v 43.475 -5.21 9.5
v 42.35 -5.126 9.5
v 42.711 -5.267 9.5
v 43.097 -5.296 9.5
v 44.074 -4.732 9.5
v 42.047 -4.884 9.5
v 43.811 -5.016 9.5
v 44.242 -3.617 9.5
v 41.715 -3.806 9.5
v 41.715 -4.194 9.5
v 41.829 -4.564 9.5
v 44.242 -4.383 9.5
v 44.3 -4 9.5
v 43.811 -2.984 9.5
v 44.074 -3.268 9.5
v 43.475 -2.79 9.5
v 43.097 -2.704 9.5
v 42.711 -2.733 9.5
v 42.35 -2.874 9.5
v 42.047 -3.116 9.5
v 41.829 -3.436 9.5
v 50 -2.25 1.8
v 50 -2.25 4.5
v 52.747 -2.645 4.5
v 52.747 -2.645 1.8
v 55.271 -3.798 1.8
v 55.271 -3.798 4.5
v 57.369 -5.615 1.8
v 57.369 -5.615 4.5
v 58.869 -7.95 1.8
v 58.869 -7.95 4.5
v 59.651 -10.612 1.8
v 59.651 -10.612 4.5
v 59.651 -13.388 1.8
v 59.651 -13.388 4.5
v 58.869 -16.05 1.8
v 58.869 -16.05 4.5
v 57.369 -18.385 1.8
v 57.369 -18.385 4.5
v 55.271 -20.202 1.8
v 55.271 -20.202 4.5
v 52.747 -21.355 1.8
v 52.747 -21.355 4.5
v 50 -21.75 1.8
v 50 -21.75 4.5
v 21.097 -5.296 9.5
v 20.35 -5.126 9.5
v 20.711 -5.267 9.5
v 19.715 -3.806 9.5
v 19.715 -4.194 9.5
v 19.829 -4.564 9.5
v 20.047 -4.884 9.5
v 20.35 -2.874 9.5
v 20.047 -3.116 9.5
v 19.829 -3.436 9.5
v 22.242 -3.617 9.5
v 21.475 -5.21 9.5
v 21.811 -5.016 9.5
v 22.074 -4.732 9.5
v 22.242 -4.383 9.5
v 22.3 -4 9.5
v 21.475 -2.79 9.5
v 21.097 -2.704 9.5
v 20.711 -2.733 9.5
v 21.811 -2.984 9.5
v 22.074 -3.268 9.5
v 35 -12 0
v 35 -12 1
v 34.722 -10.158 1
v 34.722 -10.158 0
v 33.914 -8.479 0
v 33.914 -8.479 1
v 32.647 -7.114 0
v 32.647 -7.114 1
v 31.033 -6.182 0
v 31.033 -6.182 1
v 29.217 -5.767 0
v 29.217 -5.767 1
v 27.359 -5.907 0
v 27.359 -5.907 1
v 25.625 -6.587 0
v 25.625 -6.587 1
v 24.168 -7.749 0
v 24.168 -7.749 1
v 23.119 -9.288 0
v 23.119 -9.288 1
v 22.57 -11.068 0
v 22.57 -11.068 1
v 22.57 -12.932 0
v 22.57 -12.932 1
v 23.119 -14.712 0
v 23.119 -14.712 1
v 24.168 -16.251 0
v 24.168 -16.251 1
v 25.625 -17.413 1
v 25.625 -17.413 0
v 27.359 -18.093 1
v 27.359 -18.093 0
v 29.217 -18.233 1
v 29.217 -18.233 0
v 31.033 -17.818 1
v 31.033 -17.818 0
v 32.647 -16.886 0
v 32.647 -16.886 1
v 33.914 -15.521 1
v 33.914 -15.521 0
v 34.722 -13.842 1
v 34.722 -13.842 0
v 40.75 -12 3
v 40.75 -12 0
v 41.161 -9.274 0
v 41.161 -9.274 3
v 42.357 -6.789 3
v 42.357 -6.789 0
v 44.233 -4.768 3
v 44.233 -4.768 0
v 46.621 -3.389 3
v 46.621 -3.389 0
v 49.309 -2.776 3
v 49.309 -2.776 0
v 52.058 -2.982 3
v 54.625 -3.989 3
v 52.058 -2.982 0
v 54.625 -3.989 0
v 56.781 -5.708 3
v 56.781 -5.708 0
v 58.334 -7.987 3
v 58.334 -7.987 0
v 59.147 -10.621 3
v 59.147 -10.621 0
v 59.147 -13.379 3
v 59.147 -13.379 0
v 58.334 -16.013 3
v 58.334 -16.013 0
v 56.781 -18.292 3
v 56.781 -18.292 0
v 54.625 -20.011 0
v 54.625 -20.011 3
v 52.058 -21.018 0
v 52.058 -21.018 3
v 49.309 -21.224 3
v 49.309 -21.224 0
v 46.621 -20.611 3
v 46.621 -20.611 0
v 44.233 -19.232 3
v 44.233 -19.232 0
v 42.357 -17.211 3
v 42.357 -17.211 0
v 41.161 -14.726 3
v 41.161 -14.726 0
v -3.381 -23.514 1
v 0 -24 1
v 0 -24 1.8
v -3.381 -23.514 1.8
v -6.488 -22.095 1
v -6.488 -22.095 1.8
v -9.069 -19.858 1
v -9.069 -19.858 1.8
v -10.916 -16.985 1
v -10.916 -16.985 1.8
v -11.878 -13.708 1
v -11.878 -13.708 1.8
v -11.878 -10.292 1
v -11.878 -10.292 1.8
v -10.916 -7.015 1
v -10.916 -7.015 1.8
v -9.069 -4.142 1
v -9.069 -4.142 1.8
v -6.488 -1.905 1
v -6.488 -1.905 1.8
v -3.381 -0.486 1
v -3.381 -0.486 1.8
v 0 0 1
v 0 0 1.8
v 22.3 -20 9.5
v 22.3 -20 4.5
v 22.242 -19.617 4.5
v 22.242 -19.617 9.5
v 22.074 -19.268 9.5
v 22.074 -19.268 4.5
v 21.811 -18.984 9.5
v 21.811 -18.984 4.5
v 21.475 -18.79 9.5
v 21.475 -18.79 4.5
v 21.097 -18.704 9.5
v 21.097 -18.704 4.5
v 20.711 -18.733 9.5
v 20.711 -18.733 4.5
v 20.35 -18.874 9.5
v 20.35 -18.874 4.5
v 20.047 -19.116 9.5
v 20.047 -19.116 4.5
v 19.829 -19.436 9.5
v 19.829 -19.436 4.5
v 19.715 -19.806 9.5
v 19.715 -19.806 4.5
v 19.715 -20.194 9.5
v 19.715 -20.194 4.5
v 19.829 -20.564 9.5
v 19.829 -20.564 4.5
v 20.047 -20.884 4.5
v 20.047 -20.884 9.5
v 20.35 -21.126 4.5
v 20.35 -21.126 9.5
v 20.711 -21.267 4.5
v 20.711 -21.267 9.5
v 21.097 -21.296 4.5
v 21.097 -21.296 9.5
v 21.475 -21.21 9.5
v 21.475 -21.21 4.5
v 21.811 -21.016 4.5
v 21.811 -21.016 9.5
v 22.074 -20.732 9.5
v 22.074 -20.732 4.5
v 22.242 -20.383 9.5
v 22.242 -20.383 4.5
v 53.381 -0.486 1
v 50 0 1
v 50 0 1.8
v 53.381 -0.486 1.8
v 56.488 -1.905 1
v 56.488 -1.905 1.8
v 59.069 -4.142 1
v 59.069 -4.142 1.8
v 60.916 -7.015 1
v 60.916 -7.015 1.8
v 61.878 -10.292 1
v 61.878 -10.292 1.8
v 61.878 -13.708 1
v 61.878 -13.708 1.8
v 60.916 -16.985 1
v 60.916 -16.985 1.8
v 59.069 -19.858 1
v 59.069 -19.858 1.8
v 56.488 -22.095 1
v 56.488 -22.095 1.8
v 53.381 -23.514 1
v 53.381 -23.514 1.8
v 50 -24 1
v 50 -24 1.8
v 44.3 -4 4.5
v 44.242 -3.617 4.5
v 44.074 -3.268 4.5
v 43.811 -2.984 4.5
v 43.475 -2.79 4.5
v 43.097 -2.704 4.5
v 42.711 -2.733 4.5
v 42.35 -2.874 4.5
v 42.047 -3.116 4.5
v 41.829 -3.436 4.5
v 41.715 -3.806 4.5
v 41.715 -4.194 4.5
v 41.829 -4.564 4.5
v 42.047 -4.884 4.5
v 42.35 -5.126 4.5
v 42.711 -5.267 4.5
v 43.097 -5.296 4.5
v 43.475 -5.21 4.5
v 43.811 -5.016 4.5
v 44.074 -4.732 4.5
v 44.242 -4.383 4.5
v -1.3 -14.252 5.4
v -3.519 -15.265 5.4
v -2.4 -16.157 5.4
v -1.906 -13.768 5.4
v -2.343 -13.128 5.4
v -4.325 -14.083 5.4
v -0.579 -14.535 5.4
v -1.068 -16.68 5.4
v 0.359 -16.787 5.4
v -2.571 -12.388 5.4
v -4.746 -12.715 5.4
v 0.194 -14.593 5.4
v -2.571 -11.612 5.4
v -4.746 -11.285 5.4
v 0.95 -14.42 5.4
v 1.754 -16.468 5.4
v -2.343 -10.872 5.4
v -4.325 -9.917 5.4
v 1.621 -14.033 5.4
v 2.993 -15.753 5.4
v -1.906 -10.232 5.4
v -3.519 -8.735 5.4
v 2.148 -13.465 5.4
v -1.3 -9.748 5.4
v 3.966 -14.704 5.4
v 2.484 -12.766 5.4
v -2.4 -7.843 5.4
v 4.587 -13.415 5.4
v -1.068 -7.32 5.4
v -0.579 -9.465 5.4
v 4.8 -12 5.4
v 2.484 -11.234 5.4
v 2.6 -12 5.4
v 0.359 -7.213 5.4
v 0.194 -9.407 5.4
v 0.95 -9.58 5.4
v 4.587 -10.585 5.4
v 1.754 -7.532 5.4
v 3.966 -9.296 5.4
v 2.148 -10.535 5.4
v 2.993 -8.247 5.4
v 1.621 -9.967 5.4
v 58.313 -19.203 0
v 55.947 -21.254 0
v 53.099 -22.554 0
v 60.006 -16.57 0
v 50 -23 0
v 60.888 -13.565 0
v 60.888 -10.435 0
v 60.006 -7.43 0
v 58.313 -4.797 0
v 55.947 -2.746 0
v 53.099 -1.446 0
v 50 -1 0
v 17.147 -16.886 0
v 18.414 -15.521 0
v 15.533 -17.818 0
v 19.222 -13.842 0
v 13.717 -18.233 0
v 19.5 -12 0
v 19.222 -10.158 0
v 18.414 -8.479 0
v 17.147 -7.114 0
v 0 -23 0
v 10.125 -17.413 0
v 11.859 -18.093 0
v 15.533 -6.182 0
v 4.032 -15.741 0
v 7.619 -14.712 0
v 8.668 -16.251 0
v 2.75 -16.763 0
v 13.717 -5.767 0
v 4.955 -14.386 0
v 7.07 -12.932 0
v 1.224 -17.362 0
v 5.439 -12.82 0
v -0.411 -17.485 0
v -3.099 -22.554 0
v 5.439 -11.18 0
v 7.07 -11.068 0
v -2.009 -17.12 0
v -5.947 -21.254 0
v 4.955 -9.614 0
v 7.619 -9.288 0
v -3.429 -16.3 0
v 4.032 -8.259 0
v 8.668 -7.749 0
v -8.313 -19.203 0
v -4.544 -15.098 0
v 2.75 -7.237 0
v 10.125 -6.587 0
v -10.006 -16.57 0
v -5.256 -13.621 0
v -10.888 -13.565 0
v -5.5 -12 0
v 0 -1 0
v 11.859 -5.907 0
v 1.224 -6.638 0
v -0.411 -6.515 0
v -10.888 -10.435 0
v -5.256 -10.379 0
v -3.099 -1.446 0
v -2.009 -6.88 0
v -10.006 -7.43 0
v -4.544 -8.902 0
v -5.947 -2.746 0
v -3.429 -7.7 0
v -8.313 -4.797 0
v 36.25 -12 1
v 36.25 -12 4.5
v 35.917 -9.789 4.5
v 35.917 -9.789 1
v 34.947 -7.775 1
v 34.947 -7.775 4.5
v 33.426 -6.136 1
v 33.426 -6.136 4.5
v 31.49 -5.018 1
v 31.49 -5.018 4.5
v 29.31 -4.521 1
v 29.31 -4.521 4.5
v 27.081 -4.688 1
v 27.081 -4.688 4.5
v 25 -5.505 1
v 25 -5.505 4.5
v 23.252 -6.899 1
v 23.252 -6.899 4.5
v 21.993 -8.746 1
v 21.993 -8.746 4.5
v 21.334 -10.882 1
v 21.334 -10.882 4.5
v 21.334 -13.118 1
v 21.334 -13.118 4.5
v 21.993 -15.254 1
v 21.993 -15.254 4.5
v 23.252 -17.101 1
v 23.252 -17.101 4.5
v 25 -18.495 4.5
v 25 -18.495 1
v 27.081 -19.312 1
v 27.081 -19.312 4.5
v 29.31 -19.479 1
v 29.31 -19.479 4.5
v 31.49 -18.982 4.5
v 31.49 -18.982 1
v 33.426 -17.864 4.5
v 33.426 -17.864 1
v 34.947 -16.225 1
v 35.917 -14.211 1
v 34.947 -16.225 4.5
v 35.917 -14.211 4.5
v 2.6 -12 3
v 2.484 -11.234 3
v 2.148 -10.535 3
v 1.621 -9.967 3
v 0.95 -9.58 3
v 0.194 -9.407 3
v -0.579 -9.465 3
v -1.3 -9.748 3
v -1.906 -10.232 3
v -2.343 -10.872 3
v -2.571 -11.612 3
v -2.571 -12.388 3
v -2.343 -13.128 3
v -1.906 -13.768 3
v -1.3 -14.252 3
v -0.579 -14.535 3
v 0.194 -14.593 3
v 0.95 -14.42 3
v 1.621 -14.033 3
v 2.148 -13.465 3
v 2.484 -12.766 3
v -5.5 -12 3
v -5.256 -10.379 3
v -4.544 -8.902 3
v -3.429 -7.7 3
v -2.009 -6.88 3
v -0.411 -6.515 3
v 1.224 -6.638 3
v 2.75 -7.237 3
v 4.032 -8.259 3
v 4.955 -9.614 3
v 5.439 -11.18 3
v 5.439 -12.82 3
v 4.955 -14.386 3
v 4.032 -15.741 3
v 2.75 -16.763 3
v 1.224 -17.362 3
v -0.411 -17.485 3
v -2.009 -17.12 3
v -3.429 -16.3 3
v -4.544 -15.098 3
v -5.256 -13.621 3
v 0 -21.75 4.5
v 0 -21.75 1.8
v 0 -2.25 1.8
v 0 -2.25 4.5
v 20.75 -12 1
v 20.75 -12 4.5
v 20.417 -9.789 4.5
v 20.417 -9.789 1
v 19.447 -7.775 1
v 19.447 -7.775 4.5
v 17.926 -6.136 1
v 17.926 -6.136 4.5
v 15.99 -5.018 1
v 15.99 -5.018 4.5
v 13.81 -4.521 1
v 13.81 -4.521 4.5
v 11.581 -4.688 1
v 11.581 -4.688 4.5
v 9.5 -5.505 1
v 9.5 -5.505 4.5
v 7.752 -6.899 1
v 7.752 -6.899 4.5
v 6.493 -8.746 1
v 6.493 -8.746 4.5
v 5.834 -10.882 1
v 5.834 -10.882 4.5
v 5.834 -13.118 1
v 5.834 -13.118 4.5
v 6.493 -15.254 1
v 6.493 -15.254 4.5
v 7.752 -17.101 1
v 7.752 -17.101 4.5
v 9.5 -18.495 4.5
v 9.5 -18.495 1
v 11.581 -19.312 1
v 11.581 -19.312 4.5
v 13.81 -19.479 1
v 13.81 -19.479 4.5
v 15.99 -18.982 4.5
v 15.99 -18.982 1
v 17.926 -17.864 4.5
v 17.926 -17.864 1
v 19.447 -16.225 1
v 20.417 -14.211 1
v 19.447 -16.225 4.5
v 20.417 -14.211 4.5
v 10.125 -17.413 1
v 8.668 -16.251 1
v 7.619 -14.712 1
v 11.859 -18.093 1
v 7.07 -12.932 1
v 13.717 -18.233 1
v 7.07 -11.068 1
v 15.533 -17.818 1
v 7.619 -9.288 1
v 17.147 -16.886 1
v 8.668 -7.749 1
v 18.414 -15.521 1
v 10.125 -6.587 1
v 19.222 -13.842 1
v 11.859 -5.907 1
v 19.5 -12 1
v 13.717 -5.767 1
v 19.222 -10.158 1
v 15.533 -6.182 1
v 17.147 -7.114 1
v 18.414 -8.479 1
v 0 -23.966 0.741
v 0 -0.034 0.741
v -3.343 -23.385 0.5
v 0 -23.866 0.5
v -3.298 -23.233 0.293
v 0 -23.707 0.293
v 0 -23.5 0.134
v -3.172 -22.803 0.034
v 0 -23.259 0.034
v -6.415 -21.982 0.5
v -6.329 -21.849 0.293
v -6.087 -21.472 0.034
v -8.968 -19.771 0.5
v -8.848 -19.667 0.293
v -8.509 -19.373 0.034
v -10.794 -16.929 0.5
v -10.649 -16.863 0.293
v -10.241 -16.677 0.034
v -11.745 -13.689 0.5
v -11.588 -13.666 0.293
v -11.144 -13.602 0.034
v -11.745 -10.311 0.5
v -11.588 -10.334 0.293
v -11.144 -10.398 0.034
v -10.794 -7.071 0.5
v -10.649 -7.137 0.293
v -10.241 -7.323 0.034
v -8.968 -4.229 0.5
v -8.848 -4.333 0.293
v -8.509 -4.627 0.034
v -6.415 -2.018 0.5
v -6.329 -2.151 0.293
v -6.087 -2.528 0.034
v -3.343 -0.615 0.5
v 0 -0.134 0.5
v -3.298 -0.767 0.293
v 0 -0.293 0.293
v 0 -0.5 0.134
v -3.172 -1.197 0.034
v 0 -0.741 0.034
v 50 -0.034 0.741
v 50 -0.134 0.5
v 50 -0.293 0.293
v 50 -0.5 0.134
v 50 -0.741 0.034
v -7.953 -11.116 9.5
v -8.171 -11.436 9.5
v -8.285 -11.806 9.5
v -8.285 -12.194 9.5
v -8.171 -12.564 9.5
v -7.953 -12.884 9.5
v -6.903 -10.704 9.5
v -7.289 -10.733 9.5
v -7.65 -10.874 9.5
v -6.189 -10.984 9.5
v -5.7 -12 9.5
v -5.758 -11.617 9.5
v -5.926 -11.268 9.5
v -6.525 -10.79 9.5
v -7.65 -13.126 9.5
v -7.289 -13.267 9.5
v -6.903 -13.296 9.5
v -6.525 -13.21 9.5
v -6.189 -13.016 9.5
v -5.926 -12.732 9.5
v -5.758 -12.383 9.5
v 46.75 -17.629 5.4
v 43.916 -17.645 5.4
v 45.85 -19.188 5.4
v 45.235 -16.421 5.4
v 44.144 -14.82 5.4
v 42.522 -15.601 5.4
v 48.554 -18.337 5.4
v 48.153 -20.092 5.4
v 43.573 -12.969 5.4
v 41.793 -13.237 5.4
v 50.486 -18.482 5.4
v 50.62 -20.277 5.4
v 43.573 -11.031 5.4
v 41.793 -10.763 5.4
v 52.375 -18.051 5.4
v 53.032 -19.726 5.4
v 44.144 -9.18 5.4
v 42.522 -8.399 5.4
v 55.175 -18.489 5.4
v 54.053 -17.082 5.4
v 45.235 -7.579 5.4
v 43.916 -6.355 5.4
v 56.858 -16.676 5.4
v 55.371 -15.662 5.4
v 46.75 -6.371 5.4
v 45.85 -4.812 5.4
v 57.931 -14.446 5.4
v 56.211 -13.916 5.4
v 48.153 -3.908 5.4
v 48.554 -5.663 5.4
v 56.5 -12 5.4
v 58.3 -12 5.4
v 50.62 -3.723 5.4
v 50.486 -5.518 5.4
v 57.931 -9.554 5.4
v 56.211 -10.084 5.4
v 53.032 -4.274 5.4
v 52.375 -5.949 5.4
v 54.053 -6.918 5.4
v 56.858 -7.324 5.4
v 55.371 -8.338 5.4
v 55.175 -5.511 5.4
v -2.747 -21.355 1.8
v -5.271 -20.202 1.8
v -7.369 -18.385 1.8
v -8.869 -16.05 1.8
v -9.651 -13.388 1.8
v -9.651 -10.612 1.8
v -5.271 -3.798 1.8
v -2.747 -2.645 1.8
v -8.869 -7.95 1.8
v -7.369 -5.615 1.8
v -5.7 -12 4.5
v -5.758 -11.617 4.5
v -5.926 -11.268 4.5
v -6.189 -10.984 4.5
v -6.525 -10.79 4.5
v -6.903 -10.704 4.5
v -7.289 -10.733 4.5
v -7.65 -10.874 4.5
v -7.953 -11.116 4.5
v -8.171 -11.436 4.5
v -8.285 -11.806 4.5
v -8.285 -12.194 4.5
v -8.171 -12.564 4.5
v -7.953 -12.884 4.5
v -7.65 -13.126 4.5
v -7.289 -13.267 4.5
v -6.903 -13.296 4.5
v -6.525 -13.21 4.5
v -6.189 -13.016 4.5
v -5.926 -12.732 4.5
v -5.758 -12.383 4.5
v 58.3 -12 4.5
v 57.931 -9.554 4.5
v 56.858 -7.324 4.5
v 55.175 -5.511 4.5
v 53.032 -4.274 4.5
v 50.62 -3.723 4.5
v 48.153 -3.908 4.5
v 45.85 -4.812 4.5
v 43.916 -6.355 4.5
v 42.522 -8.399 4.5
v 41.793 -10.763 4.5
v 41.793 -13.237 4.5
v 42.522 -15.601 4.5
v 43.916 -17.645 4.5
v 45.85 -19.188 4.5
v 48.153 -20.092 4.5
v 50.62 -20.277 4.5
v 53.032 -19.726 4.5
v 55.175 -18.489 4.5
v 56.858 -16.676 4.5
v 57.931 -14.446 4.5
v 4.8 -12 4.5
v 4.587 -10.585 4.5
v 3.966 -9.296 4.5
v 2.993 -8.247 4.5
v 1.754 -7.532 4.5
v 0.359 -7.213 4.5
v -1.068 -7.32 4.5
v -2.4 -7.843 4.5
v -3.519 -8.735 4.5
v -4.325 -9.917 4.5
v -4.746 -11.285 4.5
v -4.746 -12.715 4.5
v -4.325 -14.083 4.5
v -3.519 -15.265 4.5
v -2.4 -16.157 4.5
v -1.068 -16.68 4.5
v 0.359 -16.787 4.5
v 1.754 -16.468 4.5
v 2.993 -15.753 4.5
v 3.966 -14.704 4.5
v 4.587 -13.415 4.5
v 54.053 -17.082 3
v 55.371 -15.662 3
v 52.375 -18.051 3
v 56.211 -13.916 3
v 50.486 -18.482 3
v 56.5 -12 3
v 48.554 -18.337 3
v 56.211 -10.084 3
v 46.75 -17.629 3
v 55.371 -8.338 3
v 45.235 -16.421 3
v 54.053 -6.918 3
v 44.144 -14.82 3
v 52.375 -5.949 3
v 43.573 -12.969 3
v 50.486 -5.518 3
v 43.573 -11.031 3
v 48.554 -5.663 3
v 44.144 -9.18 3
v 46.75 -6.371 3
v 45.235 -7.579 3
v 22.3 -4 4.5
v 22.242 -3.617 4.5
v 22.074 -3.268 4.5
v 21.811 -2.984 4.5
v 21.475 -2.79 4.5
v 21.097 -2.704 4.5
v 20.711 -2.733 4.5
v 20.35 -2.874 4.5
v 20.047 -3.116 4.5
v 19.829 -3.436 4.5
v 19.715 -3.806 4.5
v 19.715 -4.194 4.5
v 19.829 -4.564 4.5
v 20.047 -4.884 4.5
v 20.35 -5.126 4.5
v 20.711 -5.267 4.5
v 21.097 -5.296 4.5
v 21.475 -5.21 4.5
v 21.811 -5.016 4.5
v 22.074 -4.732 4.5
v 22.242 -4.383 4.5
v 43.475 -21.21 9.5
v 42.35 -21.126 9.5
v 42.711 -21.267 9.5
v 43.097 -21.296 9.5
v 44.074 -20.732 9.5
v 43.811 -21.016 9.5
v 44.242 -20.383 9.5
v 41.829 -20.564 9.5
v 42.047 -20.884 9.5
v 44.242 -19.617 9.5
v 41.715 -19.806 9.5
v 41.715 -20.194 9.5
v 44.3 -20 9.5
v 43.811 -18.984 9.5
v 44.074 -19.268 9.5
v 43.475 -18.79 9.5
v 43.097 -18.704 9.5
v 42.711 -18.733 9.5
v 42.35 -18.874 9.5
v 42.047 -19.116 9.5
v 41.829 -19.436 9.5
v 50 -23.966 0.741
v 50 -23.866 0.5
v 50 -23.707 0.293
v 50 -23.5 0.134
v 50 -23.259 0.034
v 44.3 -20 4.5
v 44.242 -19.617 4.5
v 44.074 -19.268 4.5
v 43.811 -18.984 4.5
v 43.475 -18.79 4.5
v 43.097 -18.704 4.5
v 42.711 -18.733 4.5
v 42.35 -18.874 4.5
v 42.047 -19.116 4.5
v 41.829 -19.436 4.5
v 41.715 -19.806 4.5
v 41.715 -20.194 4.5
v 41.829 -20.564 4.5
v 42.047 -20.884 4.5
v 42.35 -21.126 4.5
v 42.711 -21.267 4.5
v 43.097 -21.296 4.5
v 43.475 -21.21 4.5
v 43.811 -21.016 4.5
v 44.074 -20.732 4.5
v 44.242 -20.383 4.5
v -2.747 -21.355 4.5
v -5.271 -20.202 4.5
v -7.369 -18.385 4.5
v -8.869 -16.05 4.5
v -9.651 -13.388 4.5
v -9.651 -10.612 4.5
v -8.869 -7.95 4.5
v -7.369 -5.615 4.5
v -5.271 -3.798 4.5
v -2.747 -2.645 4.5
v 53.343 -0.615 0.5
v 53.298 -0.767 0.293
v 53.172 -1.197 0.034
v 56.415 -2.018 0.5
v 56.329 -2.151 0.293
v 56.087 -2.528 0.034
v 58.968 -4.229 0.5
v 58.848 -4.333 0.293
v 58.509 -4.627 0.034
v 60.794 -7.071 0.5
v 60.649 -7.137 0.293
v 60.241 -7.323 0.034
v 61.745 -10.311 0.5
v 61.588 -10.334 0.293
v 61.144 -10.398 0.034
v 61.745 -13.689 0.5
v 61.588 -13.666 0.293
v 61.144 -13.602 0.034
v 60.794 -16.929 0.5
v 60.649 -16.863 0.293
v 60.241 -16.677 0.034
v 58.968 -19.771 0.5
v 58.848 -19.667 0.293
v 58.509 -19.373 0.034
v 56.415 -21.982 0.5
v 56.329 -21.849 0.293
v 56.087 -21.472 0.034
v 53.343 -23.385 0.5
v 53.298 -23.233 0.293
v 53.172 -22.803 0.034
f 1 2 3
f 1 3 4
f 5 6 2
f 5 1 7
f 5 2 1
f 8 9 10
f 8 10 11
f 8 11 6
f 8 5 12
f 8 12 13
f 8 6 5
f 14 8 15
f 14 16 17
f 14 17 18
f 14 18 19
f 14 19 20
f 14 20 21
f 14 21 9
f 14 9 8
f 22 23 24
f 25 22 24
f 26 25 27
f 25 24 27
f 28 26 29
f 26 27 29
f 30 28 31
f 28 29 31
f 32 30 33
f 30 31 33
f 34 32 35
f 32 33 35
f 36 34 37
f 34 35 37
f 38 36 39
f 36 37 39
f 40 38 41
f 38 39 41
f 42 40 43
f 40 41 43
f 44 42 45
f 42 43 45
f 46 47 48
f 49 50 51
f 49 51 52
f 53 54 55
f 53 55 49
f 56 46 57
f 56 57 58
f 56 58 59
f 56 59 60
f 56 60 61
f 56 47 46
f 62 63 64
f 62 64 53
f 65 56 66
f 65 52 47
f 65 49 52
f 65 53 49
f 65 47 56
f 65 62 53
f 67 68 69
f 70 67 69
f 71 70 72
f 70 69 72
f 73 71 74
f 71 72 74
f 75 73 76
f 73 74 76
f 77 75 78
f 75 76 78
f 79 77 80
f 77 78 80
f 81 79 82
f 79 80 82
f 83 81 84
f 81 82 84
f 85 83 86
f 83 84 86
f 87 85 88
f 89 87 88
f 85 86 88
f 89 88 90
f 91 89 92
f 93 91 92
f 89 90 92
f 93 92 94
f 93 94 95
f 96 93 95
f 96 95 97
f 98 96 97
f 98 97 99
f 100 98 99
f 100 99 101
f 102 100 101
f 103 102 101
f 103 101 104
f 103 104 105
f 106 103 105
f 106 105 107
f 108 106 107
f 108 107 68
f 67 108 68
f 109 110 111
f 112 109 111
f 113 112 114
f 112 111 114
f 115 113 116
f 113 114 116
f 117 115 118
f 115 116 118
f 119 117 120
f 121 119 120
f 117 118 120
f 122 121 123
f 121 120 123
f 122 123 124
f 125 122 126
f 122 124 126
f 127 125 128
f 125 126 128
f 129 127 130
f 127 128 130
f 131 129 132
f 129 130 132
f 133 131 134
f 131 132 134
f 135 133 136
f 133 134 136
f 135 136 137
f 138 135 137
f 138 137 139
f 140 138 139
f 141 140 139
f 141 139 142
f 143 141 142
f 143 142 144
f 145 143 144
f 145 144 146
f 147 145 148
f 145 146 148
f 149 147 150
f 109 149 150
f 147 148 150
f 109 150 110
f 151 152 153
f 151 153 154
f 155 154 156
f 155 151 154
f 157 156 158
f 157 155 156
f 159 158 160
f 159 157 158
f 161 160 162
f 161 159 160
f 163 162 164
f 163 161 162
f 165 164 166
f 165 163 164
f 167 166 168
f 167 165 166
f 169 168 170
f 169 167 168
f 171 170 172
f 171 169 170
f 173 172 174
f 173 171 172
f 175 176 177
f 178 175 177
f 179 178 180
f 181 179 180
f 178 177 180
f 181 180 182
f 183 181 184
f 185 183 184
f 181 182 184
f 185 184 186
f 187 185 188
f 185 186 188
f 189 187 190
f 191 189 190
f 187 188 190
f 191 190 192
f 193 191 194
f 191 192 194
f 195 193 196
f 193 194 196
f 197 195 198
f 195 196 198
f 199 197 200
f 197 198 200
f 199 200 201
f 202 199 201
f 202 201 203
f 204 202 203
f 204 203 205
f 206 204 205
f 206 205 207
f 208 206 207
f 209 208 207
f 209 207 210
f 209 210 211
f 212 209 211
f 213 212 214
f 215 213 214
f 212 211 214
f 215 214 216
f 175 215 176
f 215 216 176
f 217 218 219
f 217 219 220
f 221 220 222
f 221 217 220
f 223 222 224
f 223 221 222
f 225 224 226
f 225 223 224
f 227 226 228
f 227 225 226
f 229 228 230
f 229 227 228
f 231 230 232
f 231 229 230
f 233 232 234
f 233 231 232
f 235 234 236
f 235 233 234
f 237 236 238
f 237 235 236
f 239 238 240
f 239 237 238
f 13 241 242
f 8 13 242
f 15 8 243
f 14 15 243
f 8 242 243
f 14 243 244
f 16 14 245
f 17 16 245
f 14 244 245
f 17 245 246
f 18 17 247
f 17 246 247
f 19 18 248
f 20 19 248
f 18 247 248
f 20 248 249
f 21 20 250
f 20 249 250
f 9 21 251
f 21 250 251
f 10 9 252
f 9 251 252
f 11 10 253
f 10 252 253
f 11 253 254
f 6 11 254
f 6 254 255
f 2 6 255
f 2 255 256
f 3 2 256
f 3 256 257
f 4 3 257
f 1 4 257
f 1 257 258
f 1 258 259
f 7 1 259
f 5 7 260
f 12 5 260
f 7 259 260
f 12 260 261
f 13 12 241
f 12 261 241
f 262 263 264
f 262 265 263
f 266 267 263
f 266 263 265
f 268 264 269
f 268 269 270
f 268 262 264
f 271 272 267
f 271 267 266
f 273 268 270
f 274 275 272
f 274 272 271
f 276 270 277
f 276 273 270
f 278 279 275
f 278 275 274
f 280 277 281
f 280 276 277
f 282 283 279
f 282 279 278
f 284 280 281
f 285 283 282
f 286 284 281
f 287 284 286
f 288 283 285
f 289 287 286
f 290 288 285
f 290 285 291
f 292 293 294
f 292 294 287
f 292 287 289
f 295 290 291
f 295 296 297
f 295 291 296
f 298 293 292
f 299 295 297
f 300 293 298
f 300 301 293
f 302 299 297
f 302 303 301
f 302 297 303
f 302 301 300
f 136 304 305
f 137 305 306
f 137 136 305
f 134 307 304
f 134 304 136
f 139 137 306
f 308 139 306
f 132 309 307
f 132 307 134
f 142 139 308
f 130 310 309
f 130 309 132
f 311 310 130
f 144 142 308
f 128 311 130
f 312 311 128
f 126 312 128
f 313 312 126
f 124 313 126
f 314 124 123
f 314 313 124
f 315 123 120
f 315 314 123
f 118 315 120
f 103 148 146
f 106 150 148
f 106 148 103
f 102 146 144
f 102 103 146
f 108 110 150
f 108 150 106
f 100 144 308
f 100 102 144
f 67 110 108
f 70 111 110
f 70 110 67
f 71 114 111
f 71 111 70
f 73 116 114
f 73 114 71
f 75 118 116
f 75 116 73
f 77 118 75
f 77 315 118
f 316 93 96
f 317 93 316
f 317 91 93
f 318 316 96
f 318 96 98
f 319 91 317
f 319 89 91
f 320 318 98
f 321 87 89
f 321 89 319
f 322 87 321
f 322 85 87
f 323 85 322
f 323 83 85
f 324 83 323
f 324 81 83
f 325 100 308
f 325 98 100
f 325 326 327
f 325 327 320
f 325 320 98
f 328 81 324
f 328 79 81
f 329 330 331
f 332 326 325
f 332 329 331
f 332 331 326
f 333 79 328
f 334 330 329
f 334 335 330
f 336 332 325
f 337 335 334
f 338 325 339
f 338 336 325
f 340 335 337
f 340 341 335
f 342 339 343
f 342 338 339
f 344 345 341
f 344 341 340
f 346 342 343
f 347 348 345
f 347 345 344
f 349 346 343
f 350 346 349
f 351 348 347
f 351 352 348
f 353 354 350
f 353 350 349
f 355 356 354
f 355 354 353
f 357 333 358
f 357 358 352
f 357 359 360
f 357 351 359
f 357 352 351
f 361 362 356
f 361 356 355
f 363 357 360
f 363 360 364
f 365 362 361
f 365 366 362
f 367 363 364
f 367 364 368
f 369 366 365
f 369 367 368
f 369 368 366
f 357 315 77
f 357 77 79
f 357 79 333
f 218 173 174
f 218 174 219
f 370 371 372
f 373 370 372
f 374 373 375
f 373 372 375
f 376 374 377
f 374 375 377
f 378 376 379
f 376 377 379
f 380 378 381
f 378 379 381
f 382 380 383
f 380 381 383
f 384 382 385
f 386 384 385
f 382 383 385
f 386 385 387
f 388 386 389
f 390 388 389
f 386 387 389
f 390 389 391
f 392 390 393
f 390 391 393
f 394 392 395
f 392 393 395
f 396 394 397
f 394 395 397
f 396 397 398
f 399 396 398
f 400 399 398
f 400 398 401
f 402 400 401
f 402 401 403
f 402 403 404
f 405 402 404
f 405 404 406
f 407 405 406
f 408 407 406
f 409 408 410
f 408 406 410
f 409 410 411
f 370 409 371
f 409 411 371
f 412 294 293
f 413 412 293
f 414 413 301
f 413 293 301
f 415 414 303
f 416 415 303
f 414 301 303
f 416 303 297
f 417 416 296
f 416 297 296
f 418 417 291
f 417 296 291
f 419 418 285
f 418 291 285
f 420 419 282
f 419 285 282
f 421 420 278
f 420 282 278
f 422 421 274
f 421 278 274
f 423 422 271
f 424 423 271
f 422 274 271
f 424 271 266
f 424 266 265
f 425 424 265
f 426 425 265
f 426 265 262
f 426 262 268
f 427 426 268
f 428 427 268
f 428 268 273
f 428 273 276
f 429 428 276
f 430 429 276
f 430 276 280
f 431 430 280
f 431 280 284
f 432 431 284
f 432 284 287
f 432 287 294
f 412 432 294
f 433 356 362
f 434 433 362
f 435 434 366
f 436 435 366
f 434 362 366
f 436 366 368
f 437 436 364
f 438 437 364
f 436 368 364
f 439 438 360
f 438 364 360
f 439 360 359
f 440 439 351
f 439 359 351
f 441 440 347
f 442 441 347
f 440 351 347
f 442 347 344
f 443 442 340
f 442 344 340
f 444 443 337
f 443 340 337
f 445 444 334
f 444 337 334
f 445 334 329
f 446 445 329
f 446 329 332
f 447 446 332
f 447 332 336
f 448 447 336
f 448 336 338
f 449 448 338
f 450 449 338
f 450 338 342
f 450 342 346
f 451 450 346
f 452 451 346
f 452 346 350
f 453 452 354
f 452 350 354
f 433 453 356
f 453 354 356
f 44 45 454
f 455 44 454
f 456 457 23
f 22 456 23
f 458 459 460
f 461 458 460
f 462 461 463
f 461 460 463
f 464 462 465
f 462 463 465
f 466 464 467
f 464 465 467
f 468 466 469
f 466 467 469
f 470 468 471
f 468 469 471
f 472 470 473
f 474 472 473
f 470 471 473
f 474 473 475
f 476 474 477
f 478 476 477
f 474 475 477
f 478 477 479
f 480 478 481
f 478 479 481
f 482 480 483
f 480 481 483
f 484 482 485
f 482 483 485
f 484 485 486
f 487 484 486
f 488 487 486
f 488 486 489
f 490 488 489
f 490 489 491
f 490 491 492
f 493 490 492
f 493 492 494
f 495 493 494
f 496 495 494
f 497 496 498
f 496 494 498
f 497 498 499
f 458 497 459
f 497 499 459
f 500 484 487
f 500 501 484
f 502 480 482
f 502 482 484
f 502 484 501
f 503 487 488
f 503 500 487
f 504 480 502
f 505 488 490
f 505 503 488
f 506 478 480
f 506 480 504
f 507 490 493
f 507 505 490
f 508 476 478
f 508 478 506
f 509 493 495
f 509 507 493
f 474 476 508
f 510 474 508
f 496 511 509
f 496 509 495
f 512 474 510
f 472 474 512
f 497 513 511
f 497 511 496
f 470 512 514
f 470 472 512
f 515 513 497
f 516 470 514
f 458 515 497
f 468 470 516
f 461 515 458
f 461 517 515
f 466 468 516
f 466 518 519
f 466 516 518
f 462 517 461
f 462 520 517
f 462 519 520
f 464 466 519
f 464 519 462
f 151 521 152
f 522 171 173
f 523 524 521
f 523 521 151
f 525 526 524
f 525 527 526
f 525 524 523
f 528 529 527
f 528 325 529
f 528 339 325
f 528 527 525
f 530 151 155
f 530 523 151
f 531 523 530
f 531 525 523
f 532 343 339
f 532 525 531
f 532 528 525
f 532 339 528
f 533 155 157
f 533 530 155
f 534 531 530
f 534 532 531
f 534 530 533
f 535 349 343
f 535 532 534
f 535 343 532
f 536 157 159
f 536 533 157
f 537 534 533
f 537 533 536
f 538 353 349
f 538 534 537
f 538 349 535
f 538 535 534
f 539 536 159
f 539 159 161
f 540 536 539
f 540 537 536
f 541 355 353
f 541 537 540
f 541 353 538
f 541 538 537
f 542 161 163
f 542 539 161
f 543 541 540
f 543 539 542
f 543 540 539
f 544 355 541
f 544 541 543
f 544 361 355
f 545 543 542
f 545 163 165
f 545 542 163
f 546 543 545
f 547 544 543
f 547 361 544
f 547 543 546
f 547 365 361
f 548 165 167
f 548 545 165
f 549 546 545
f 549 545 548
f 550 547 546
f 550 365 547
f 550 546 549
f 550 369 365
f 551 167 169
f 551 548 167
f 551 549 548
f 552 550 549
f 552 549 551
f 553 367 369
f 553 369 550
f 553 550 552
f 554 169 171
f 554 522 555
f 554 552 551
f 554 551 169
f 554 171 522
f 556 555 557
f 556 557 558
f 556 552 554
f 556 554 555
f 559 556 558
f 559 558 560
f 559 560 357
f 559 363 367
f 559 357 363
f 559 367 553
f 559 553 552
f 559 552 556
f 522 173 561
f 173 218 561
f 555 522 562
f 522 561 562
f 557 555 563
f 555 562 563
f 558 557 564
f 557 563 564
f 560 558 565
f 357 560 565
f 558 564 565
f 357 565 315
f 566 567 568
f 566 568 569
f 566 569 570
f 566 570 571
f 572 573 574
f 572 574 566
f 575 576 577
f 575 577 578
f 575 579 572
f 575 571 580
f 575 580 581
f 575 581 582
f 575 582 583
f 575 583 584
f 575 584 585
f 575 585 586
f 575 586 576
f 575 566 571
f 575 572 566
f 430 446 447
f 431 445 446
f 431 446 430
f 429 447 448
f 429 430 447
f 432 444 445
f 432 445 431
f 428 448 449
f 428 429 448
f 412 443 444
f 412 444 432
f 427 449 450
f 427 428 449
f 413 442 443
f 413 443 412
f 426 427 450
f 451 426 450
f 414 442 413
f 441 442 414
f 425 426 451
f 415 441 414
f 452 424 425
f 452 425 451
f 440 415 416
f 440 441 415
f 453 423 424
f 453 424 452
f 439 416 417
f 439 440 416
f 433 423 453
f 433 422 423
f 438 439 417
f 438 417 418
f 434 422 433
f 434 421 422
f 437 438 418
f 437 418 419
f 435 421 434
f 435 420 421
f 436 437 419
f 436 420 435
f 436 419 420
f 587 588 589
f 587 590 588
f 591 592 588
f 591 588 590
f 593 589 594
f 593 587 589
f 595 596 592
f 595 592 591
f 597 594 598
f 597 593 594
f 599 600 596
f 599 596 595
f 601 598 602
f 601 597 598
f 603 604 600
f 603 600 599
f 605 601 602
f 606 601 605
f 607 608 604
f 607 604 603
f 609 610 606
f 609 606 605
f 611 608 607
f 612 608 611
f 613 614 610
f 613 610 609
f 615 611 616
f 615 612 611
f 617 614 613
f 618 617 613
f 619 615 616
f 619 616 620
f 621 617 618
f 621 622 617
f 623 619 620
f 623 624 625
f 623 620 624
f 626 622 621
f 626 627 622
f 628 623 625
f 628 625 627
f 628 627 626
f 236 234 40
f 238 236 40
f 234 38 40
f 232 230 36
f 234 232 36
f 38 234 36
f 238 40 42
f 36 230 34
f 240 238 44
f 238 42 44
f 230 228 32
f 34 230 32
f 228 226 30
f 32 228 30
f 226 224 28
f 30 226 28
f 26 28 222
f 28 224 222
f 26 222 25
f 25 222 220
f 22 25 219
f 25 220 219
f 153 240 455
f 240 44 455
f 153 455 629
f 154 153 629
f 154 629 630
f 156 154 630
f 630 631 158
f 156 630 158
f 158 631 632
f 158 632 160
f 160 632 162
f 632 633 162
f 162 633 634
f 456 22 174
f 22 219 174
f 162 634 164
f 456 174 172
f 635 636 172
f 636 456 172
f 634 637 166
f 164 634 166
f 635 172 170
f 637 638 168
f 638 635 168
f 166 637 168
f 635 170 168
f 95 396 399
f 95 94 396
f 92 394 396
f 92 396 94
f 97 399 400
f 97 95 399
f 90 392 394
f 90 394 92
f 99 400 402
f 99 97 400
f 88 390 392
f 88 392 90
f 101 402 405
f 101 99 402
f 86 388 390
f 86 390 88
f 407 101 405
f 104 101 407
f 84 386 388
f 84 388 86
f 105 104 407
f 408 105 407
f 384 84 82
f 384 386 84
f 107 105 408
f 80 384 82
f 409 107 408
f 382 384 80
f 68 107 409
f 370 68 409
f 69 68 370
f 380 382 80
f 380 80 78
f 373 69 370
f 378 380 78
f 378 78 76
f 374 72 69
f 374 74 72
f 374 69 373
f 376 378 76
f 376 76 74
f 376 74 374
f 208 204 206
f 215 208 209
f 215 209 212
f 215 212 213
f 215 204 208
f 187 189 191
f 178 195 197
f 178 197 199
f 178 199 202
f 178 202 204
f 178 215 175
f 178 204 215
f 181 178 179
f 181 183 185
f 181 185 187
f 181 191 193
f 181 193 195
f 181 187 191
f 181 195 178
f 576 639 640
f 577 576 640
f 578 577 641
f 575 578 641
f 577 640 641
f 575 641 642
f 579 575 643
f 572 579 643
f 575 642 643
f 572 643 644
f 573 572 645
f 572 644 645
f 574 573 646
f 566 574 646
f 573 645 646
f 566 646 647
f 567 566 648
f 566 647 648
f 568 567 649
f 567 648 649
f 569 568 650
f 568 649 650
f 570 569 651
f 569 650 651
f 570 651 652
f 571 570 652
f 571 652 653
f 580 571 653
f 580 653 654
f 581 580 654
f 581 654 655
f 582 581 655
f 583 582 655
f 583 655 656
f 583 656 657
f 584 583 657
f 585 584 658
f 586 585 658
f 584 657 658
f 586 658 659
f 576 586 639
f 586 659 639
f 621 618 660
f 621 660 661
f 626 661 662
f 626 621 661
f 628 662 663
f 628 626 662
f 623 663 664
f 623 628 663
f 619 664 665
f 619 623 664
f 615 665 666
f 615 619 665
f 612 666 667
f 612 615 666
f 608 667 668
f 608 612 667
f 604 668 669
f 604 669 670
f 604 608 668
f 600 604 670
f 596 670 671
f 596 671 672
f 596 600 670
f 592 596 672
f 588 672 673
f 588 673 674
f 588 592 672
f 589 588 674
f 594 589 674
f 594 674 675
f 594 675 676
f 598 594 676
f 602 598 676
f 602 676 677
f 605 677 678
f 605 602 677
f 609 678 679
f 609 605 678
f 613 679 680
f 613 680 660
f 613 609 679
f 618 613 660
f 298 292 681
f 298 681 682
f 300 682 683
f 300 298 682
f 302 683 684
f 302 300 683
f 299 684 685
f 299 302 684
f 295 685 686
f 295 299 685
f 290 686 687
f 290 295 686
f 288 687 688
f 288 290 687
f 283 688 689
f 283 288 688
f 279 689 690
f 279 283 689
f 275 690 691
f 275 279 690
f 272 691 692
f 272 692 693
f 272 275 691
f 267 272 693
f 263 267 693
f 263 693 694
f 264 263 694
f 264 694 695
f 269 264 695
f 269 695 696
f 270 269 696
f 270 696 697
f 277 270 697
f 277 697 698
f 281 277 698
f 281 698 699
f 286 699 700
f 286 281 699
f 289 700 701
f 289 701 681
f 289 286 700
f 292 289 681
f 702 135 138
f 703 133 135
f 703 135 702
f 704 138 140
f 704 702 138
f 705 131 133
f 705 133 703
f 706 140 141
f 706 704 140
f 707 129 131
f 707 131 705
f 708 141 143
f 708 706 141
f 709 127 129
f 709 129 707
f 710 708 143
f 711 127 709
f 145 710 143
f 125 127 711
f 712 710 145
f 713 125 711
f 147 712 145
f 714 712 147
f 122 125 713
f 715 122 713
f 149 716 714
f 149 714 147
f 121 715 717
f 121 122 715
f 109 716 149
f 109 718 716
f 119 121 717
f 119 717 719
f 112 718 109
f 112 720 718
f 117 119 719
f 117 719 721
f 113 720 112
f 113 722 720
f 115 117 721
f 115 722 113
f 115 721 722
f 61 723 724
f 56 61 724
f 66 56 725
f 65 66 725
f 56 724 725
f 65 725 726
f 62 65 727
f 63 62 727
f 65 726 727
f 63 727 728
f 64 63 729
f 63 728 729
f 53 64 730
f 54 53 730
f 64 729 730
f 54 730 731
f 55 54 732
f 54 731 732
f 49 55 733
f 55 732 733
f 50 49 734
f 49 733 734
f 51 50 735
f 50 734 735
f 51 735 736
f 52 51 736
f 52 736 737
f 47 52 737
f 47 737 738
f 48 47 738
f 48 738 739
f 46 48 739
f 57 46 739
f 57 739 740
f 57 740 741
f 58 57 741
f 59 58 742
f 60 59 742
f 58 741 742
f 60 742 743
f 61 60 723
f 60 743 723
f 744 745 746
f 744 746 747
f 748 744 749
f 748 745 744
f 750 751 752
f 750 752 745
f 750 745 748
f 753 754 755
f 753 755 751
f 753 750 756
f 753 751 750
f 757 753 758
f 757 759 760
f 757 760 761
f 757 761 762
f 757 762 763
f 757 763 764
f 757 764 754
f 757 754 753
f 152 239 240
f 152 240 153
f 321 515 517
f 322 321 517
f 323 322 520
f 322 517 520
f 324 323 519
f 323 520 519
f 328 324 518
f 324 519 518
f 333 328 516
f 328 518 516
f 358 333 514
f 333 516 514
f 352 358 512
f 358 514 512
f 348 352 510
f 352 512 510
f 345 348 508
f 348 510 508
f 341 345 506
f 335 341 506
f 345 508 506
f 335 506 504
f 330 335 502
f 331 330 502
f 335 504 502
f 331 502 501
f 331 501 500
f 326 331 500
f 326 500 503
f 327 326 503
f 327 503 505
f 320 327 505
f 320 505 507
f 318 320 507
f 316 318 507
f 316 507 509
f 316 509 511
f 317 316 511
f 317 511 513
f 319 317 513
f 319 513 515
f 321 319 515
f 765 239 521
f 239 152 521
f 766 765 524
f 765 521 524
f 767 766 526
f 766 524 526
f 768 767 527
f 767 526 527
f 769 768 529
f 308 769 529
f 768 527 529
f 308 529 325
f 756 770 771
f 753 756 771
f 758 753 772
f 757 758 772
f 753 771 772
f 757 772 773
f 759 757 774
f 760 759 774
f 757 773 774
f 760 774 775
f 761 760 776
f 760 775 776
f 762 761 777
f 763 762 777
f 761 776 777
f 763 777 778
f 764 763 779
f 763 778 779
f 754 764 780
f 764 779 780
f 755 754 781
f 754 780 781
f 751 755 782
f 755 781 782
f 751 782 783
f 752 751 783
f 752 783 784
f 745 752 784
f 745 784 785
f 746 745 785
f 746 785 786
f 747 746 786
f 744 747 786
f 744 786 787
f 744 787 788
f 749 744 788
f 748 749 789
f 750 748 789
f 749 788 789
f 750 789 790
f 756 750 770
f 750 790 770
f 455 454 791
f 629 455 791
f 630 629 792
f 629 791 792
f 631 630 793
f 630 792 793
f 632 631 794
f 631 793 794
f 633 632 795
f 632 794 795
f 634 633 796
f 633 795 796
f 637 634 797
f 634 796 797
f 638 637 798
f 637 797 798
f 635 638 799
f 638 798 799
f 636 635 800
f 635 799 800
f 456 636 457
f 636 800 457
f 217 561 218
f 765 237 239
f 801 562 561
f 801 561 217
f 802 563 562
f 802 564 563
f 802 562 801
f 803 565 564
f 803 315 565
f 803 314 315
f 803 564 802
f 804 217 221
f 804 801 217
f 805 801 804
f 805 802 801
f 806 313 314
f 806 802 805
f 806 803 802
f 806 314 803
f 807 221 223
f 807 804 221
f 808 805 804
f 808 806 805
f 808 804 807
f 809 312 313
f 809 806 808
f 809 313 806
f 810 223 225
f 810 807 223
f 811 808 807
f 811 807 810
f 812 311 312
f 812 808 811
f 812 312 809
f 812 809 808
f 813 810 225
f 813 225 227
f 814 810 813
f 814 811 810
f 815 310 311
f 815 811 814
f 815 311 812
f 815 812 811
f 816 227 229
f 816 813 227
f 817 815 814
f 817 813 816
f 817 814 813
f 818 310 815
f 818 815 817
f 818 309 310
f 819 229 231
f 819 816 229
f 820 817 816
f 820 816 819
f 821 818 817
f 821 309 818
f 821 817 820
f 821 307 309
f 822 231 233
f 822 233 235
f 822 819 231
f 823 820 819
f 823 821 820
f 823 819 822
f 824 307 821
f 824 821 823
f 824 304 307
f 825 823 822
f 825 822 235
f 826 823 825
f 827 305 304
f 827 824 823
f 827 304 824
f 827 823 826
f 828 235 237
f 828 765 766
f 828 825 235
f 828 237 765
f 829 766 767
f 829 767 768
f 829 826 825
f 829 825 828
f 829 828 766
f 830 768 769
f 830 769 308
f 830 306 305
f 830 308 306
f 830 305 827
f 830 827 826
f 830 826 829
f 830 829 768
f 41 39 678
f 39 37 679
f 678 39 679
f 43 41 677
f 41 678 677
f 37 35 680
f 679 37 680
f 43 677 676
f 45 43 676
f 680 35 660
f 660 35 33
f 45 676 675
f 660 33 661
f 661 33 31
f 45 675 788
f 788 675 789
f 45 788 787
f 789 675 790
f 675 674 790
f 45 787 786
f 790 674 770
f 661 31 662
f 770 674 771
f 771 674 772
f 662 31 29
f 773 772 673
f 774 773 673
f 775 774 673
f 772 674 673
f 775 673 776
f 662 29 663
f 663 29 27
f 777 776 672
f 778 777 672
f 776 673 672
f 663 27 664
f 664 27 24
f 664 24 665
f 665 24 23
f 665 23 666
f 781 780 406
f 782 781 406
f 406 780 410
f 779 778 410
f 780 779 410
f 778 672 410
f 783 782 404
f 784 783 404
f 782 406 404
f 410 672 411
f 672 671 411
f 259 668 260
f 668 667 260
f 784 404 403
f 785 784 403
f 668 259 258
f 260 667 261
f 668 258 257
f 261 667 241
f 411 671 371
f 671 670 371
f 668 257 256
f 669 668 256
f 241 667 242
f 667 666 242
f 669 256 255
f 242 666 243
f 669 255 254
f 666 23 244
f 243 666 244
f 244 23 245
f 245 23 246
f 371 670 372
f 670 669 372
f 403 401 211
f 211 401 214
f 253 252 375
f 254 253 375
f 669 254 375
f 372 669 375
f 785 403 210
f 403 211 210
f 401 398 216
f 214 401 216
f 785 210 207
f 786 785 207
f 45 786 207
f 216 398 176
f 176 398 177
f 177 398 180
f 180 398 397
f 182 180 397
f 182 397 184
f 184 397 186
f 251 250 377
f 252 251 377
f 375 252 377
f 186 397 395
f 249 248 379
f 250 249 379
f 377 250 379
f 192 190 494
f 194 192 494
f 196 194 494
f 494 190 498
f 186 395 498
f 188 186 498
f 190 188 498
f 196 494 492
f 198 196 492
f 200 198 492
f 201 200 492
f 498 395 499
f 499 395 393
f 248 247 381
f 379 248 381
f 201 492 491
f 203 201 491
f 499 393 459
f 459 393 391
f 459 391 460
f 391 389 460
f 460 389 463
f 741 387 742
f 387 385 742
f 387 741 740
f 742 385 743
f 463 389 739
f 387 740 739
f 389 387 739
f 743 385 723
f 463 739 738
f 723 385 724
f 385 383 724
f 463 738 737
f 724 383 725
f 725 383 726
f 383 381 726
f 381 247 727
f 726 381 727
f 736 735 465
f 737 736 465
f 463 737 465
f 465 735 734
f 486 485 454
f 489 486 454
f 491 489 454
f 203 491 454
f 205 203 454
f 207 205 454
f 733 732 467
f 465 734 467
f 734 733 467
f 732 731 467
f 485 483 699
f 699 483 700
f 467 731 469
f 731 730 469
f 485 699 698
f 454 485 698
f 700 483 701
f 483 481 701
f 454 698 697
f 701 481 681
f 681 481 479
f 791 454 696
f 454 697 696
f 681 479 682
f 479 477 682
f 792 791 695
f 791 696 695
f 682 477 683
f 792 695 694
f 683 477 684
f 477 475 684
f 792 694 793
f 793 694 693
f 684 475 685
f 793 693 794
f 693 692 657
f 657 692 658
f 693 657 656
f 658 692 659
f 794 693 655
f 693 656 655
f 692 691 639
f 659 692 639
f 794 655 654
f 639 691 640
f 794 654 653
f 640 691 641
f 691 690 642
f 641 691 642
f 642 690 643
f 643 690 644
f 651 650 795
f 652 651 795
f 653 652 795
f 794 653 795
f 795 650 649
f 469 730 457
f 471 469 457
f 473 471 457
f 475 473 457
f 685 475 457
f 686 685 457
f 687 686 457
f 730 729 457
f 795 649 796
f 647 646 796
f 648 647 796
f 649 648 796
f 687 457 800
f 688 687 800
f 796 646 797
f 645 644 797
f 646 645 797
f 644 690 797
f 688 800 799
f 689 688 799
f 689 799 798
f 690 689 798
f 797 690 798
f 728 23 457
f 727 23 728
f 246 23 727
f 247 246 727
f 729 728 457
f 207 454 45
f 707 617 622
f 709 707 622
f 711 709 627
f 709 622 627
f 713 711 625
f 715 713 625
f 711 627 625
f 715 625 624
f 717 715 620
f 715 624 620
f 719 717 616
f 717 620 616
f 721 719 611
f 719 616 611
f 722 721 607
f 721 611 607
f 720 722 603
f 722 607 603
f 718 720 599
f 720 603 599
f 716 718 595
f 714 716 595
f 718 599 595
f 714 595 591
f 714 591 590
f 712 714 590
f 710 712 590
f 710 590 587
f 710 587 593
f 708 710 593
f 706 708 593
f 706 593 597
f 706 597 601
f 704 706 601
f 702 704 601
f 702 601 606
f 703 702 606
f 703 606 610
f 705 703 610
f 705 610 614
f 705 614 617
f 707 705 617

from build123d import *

# Parameters (mm, degrees)
EXTRUDE_1_DEPTH     = 4.5
CUT_EXTRUDE_1_DEPTH = 2.7
SKETCH_3_R          = 2.6
SKETCH_3_R_2        = 6.5
SKETCH_3_R_3        = 6.25
CUT_EXTRUDE_2_DEPTH = 67.635200908
SKETCH_4_R          = 5.5
SKETCH_4_R_2        = 9.25
CUT_EXTRUDE_3_DEPTH = 3
FILLET_1_R          = 1
SKETCH_7_R          = 7.5
CUT_EXTRUDE_6_DEPTH = 3.5
SKETCH_9_R          = 1.3
EXTRUDE_2_DEPTH     = 5
EXTRUDE_START       = 0.9
SKETCH_10_R         = 4.8
SKETCH_10_R_2       = 2.6
SKETCH_10_R_3       = 8.3
SKETCH_10_R_4       = 6.5
EXTRUDE_3_DEPTH     = 0.9


with BuildPart() as part:
    # Эскиз1 → Бобышка-Вытянуть1 (new body)
    with BuildSketch(Plane.XY):
        with BuildLine():
            Line((0, 0), (50, 0))
            ThreePointArc((50, 0), (62, -12), (50, -24))
            Line((50, -24), (0, -24))
            ThreePointArc((0, -24), (-12, -12), (0, 0))
        make_face()
    extrude(amount=EXTRUDE_1_DEPTH)

    # Эскиз2 → Вырез-Вытянуть1 (cut)
    with BuildSketch(Plane.XY.offset(4.5)):
        with BuildLine():
            Line((0, 0.012347922), (50, 0.012347922))
            ThreePointArc((50, 0.012347922), (62.012347922, -12), (50, -24.012347922))
            Line((50, -24.012347922), (0, -24.012347922))
            ThreePointArc((0, -24.012347922), (-12.012347922, -12), (0, 0.012347922))
        make_face()
        with BuildLine():
            Line((0, -2.25), (50, -2.25))
            ThreePointArc((50, -2.25), (59.75, -12), (50, -21.75))
            Line((50, -21.75), (0, -21.75))
            ThreePointArc((0, -21.75), (-9.75, -12), (0, -2.25))
        make_face(mode=Mode.SUBTRACT)
    extrude(amount=-CUT_EXTRUDE_1_DEPTH, mode=Mode.SUBTRACT)

    # Эскиз3 → Вырез-Вытянуть2 (cut, through all)
    with BuildSketch(Plane.XY.offset(4.5)):
        with Locations((0, -12)):
            Circle(SKETCH_3_R)
        with Locations((50, -12)):
            Circle(SKETCH_3_R_2)
        with Locations((13.25, -12)):
            Circle(SKETCH_3_R_3)
        with Locations((28.75, -12)):
            Circle(SKETCH_3_R_3)
    extrude(amount=-CUT_EXTRUDE_2_DEPTH, mode=Mode.SUBTRACT)

    # Эскиз4 → Вырез-Вытянуть3 (cut)
    with BuildSketch(Plane(origin=(0, 0, 0), x_dir=(-1, 0, 0), z_dir=(0, 0, -1))):
        with Locations((0, -12)):
            Circle(SKETCH_4_R)
        with Locations((-50, -12)):
            Circle(SKETCH_4_R_2)
    extrude(amount=-CUT_EXTRUDE_3_DEPTH, mode=Mode.SUBTRACT)

    # Скругление1
    fillet_1_edges = [part.edges().sort_by_distance(p)[0] for p in [
        (25, 0, 0),
        (62, -12, 0),
        (25, -24, 0),
        (-12, -12, 0),
    ]]
    fillet(fillet_1_edges, radius=FILLET_1_R)

    # Эскиз7 → Вырез-Вытянуть6 (cut)
    with BuildSketch(Plane.XY.offset(4.5)):
        with Locations((28.75, -12)):
            Circle(SKETCH_7_R)
        with Locations((13.25, -12)):
            Circle(SKETCH_7_R)
    extrude(amount=-CUT_EXTRUDE_6_DEPTH, mode=Mode.SUBTRACT)

    # Эскиз9 → Бобышка-Вытянуть2 (add)
    with BuildSketch(Plane.XY.offset(4.5)):
        with Locations((21, -4)):
            Circle(SKETCH_9_R)
        with Locations((21, -20)):
            Circle(SKETCH_9_R)
        with Locations((-7, -12)):
            Circle(SKETCH_9_R)
        with Locations((43, -4)):
            Circle(SKETCH_9_R)
        with Locations((43, -20)):
            Circle(SKETCH_9_R)
    extrude(amount=EXTRUDE_2_DEPTH)

    # Эскиз10 → Бобышка-Вытянуть3 (add)
    # profile 1 of 2: a face of its own
    with BuildSketch(Plane.XY.offset(4.5).offset(EXTRUDE_START)):
        with Locations((0, -12)):
            Circle(SKETCH_10_R)
        with Locations((0, -12)):
            Circle(SKETCH_10_R_2, mode=Mode.SUBTRACT)
    # profile 2 of 2: a face of its own
    with BuildSketch(Plane.XY.offset(4.5).offset(EXTRUDE_START)):
        with Locations((50, -12)):
            Circle(SKETCH_10_R_3)
        with Locations((50, -12)):
            Circle(SKETCH_10_R_4, mode=Mode.SUBTRACT)
    extrude(amount=-EXTRUDE_3_DEPTH)


solid = part.part
